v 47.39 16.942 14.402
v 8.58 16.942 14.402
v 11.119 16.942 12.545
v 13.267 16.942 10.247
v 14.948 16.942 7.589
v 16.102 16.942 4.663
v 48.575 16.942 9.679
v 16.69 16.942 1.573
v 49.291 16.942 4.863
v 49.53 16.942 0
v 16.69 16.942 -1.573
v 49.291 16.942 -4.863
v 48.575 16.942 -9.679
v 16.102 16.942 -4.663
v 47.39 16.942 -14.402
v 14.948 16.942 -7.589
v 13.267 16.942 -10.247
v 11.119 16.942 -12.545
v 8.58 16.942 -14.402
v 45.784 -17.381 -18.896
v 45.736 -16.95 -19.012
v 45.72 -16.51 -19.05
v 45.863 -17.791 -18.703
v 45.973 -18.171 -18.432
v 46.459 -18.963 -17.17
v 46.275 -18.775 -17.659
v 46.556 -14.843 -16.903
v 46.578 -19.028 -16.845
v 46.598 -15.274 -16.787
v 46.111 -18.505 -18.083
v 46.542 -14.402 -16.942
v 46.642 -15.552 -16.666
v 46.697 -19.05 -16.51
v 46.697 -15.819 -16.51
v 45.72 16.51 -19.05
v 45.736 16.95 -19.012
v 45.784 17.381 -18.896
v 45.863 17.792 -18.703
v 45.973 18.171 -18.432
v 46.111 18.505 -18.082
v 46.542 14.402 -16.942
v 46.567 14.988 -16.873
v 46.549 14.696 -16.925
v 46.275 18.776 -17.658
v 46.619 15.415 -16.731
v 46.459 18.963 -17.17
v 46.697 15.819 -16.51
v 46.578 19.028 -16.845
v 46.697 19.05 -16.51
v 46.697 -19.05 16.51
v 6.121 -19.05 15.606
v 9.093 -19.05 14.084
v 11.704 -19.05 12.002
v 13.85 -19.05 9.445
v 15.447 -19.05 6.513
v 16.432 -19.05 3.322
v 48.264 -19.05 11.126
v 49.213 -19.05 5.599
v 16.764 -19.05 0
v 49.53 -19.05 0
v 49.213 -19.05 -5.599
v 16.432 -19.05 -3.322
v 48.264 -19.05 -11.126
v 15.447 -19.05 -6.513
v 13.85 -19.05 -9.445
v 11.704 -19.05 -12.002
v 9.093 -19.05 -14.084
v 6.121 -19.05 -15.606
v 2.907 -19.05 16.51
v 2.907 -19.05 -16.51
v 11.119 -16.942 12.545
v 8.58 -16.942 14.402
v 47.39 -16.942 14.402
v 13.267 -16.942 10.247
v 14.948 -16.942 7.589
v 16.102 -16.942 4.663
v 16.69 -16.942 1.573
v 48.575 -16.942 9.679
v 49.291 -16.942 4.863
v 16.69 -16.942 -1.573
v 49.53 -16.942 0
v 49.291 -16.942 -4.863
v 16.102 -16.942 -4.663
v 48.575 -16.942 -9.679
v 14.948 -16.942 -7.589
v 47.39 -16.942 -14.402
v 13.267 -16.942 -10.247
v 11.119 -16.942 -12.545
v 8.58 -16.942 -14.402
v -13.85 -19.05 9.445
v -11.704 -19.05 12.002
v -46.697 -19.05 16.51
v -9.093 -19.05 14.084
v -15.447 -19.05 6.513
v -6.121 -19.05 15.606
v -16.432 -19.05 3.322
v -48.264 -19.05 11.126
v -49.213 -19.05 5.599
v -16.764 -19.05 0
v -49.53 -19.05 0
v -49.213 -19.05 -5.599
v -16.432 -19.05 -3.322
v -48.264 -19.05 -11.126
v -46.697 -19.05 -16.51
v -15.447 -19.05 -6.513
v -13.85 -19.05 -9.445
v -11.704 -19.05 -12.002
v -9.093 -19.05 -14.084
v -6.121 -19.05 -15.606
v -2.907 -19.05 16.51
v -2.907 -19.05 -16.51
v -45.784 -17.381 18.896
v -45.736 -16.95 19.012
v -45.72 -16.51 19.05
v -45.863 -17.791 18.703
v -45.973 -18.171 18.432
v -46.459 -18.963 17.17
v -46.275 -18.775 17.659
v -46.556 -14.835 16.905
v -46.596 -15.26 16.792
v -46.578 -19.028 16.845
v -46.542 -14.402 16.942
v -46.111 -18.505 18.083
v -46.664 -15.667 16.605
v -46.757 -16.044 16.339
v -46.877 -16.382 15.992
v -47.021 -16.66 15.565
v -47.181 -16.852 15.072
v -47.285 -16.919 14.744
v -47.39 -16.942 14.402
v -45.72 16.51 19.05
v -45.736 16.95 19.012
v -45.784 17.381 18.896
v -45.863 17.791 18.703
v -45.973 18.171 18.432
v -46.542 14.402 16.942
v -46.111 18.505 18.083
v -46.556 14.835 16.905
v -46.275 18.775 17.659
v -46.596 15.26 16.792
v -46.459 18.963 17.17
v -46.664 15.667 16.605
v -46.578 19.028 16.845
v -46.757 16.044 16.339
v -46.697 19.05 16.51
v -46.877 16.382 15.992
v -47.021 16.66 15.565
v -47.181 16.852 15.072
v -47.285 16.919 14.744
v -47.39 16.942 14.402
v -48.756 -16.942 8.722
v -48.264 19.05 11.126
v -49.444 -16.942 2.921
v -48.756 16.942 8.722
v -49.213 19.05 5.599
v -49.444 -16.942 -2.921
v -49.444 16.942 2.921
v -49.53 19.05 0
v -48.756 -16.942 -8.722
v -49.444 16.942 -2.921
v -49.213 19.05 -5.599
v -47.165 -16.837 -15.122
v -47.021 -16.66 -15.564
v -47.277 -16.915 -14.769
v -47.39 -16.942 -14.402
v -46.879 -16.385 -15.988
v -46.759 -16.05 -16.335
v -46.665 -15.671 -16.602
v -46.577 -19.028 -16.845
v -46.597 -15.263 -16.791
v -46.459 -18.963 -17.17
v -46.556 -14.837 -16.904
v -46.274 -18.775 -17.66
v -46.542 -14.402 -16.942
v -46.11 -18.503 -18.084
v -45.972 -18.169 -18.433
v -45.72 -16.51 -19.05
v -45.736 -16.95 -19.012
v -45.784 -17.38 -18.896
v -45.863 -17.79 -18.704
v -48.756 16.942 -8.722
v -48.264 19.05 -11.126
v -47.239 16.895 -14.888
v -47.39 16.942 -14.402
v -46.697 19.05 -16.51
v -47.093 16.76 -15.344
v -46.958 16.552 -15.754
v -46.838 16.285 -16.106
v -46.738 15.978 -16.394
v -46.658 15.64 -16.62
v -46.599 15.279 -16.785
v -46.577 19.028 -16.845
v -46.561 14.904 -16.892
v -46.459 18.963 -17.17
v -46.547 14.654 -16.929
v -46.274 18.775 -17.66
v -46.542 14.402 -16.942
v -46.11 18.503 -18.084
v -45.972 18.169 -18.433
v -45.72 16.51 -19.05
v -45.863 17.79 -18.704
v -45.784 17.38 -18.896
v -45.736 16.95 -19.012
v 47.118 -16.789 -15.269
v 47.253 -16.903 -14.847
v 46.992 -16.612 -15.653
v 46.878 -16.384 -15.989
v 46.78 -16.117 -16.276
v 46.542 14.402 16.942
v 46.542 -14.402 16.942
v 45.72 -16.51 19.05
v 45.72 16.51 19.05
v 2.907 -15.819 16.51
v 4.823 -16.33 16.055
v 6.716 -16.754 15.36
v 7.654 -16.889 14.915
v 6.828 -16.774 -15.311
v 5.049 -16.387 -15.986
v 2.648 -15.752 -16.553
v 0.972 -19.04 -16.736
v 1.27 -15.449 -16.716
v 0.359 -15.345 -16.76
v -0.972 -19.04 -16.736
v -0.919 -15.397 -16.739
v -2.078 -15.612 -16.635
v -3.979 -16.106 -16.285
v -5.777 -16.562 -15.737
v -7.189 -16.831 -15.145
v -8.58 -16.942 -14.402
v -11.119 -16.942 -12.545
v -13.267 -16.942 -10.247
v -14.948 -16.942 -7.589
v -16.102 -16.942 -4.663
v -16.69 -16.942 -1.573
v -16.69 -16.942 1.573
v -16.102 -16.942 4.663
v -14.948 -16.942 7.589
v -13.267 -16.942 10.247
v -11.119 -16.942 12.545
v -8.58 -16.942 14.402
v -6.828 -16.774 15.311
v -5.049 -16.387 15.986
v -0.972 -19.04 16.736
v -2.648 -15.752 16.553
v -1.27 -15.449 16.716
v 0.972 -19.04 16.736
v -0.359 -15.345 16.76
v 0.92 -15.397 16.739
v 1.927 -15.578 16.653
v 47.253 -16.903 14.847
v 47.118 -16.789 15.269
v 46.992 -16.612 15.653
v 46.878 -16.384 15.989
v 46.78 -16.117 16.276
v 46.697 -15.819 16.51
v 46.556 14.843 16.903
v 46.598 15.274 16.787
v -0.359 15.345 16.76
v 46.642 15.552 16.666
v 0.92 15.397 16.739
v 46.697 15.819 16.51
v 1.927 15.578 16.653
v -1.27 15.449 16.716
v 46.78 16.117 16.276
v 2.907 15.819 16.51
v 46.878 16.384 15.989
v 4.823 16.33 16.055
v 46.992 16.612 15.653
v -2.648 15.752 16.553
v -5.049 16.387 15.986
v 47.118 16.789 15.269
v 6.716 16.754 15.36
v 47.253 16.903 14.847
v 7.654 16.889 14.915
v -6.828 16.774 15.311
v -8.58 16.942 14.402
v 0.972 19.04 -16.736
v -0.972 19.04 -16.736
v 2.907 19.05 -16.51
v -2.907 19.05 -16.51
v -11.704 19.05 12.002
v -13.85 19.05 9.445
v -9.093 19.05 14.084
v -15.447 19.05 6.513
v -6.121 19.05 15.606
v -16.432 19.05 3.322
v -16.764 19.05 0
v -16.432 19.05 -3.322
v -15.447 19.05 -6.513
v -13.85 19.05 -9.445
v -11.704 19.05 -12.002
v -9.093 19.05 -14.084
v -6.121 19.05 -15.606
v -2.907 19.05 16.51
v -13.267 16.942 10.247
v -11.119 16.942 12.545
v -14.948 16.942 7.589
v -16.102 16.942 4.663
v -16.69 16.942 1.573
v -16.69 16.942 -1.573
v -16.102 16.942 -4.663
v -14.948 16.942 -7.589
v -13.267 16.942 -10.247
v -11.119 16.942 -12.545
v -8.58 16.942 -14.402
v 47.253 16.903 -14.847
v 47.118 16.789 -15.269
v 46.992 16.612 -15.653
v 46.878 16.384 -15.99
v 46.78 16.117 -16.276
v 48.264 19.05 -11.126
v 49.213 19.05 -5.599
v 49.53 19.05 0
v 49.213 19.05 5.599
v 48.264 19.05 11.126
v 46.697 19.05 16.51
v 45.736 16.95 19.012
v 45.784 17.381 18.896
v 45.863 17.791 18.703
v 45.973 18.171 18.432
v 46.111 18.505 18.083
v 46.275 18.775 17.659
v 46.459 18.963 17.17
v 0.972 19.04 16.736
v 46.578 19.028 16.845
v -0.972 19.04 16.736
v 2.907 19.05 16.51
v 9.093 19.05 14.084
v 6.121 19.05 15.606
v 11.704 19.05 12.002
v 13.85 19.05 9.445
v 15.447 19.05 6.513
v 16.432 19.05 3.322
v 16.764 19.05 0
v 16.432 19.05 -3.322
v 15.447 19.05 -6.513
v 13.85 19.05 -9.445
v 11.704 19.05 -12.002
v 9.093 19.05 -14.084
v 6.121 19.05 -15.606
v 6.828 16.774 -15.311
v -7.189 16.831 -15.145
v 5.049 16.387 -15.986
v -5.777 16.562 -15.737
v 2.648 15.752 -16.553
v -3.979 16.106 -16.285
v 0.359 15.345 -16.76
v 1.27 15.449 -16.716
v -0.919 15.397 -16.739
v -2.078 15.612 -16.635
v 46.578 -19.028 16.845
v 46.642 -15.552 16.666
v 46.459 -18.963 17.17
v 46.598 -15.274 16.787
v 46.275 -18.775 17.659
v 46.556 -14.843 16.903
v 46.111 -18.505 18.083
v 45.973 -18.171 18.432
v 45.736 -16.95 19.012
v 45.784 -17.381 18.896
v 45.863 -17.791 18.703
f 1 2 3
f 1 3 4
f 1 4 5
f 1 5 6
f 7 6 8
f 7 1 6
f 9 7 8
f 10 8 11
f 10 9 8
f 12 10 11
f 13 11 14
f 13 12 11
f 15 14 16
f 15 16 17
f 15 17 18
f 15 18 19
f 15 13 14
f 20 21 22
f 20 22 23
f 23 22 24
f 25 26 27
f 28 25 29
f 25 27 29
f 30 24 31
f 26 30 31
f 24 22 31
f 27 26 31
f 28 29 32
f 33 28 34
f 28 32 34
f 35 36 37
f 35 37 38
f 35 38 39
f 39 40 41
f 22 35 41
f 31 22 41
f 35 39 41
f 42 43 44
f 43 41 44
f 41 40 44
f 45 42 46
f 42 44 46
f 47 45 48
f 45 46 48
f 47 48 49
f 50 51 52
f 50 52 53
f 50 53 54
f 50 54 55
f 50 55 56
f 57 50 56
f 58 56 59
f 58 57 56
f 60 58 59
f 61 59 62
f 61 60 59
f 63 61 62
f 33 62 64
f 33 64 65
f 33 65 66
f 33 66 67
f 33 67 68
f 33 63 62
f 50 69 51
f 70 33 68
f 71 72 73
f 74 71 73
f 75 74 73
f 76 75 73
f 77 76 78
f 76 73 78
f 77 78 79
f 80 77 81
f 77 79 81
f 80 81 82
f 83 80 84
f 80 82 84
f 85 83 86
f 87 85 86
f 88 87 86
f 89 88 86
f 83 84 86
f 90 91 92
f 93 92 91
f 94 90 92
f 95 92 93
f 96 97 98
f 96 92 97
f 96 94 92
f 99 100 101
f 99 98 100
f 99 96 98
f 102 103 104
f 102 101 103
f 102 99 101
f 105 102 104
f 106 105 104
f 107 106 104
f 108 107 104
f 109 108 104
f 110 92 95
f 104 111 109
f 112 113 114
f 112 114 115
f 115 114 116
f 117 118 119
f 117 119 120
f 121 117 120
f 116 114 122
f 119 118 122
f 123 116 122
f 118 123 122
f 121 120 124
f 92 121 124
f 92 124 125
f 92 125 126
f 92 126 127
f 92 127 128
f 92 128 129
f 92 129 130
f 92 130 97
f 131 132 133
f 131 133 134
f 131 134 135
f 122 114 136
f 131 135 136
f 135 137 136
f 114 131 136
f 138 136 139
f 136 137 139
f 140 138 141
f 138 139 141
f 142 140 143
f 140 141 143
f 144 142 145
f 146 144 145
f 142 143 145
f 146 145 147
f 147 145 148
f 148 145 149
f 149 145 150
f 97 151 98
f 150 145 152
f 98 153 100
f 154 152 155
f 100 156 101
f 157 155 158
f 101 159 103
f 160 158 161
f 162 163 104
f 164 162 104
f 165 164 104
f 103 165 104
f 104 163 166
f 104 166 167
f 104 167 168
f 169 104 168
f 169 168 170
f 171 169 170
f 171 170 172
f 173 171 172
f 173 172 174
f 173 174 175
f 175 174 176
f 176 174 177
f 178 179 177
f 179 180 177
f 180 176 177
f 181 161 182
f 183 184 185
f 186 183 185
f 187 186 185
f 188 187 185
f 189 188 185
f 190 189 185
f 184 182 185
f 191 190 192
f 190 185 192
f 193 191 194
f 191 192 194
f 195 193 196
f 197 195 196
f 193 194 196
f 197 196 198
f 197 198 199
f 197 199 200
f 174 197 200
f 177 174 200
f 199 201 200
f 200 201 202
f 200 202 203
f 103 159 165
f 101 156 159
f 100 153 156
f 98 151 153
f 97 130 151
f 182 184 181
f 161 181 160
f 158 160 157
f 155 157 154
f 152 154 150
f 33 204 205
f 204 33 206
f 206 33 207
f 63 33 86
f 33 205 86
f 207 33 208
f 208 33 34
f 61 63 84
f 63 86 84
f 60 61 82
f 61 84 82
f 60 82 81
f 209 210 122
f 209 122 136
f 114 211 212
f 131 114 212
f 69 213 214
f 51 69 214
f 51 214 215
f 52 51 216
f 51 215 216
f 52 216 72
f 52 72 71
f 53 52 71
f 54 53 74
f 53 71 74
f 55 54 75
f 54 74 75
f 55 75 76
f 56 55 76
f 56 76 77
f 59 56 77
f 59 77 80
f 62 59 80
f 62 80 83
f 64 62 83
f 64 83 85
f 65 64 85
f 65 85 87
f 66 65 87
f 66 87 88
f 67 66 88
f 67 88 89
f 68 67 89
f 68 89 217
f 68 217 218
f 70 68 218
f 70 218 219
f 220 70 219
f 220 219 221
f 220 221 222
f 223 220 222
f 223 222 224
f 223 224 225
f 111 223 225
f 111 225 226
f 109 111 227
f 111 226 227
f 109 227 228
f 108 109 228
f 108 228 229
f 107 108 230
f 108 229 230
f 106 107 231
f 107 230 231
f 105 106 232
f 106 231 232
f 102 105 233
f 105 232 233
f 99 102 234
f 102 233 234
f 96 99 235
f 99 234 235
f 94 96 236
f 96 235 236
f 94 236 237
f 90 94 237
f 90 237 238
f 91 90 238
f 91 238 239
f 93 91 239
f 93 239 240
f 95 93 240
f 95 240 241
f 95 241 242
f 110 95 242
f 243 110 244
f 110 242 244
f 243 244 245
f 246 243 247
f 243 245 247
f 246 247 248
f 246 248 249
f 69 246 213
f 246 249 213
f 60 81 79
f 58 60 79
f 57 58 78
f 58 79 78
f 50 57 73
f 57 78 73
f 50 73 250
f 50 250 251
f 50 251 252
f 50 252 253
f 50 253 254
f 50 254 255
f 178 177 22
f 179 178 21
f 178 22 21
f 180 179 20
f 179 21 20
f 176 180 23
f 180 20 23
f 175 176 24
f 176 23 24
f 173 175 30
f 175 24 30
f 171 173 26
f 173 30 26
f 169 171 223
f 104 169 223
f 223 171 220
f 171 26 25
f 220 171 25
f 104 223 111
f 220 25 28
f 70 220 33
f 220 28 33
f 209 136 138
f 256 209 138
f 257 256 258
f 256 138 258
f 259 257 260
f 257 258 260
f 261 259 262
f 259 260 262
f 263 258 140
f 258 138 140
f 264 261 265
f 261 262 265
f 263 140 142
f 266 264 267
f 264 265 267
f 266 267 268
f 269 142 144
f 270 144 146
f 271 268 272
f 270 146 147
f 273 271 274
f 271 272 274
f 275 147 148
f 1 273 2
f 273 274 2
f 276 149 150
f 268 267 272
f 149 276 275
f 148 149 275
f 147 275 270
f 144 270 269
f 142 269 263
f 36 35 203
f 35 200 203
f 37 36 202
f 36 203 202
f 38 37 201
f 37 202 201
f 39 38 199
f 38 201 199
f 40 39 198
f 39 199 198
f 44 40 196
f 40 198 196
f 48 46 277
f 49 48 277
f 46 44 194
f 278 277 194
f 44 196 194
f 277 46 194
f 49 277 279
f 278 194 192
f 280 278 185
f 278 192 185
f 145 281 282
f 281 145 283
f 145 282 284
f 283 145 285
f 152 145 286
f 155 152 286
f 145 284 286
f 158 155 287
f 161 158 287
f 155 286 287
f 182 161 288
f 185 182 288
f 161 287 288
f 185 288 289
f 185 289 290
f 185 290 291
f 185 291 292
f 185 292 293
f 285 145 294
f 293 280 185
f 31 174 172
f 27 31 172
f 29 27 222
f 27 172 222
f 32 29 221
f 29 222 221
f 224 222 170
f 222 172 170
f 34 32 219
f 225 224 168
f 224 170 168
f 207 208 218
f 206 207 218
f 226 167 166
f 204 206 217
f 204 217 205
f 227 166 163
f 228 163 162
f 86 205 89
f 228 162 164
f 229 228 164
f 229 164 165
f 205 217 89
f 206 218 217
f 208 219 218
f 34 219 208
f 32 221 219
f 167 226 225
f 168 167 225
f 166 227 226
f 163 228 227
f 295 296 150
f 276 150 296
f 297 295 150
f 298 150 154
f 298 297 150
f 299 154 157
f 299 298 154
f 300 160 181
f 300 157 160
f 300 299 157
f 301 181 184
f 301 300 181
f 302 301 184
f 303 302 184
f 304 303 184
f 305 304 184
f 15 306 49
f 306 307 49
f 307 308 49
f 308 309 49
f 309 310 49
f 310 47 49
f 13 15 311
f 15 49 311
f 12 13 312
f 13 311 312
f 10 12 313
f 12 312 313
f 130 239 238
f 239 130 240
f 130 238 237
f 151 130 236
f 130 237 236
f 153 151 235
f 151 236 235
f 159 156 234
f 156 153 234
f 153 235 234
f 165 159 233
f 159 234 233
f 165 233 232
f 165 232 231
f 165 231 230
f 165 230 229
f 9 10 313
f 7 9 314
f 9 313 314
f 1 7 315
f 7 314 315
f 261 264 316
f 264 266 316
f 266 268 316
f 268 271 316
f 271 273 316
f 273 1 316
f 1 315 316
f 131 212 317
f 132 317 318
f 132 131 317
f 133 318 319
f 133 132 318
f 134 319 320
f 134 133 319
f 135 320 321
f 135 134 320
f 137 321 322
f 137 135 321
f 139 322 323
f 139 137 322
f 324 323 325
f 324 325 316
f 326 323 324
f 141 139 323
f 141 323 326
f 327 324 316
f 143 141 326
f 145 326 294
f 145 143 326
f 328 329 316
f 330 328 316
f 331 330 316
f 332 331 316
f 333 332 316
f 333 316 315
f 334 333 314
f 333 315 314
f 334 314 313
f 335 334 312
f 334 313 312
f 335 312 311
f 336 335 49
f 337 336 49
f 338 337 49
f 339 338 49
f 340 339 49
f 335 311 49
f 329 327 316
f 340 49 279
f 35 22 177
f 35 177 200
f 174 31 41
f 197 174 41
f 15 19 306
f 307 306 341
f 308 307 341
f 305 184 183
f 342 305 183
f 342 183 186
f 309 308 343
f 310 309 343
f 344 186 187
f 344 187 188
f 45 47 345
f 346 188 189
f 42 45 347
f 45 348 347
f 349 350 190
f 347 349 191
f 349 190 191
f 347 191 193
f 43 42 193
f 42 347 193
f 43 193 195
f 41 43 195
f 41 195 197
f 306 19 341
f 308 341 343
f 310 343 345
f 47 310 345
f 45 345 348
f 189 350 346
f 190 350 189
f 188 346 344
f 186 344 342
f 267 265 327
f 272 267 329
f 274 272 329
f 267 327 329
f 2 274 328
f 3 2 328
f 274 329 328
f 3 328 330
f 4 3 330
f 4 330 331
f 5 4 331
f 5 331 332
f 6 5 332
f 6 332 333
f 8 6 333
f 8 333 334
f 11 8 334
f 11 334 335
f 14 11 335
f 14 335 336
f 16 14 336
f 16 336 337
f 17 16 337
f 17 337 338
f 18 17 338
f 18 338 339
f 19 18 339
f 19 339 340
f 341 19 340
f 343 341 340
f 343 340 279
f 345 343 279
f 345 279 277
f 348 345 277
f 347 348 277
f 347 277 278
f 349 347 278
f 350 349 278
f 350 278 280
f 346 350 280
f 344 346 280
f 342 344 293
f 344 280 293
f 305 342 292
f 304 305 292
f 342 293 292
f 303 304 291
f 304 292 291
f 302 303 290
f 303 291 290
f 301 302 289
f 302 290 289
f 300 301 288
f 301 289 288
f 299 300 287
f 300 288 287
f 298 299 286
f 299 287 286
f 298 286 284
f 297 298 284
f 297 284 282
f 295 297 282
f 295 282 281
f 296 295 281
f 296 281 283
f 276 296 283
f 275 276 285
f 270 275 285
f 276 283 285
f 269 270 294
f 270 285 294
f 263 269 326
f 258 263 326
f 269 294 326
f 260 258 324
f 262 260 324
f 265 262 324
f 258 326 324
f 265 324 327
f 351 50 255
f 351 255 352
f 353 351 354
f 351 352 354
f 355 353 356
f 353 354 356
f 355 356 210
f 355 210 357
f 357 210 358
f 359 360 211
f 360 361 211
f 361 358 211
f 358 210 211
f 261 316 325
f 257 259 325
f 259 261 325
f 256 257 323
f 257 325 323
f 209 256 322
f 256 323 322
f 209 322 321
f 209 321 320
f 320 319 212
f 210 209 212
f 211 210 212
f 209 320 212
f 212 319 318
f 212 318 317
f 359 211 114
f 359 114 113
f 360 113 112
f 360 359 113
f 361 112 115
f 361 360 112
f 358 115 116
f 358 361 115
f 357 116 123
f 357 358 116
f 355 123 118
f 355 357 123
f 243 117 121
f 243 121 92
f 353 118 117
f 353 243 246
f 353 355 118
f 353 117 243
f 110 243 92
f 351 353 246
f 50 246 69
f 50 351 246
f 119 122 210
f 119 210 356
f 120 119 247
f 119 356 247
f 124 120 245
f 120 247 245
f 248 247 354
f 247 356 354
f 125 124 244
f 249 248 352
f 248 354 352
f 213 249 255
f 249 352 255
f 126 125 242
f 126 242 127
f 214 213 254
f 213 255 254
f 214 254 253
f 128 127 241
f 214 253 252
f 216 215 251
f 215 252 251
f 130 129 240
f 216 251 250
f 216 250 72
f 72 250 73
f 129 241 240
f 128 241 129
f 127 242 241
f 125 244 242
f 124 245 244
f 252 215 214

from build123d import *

# Parameters (mm, degrees)
SKETCH1_W           = 38.1
SKETCH1_H           = 38.1
SKETCH1_W_2         = 33.8836
SKETCH1_H_2         = 33.8836
BOSS_EXTRUDE1_DEPTH = 50.8
FILLET1_R           = 2.54
SKETCH3_R           = 16.764
CUT_EXTRUDE2_DEPTH  = 67.295946332
CUT_EXTRUDE3_DEPTH  = 67.295946494


with BuildPart() as part:
    # Sketch1 → Boss-Extrude1 (new, symmetric)
    with BuildSketch(Plane(origin=(0, 0, 0), x_dir=(0, 0, -1), z_dir=(1, 0, 0))):
        Rectangle(SKETCH1_W, SKETCH1_H)
        Rectangle(SKETCH1_W_2, SKETCH1_H_2, mode=Mode.SUBTRACT)
    extrude(amount=BOSS_EXTRUDE1_DEPTH, both=True)

    # Fillet1
    fillet1_edges = [part.edges().sort_by_distance(p)[0] for p in [
        (0, -16.9418, -16.9418),
        (0, 16.9418, -16.9418),
        (0, 16.9418, 16.9418),
        (0, -16.9418, 16.9418),
        (0, 19.05, 19.05),
        (0, 19.05, -19.05),
        (0, -19.05, -19.05),
        (0, -19.05, 19.05),
    ]]
    fillet(fillet1_edges, radius=FILLET1_R)

    # Sketch3 → Cut-Extrude2 (cut, through all)
    with BuildSketch(Plane(origin=(0, 19.05, 0), x_dir=(1, 0, 0), z_dir=(0, 1, 0))):
        with Locations(Location((0, 0, 0), (0, 0, 279.986551447))):
            Circle(SKETCH3_R)
    extrude(amount=-CUT_EXTRUDE2_DEPTH, mode=Mode.SUBTRACT)

    # Sketch4 → Cut-Extrude3 (cut, through all)
    with BuildSketch(Plane(origin=(0, 19.05, 0), x_dir=(1, 0, 0), z_dir=(0, 1, 0))):
        with BuildLine():
            Line((-45.72, 19.05), (-50.8, 19.05))
            Line((-50.8, 19.05), (-50.8, -19.05))
            Line((-50.8, -19.05), (-45.72, -19.05))
            ThreePointArc((-45.72, -19.05), (-49.53, 0), (-45.72, 19.05))
        make_face()
        with BuildLine():
            Line((50.8, 16.51), (46.69733183, 16.51))
            ThreePointArc((46.69733183, 16.51), (48.81669666, 8.375621006), (49.53, 0))
            ThreePointArc((49.53, 0), (48.81669666, -8.375621006), (46.69733183, -16.51))
            Line((46.69733183, -16.51), (50.8, -16.51))
            Line((50.8, -16.51), (50.8, 16.51))
        make_face()
        with BuildLine():
            Line((50.8, 19.05), (45.72, 19.05))
            ThreePointArc((45.72, 19.05), (46.226114974, 17.786713985), (46.69733183, 16.51))
            Line((46.69733183, 16.51), (50.8, 16.51))
            Line((50.8, 16.51), (50.8, 19.05))
        make_face()
        with BuildLine():
            ThreePointArc((46.69733183, -16.51), (46.226114974, -17.786713985), (45.72, -19.05))
            Line((45.72, -19.05), (50.8, -19.05))
            Line((50.8, -19.05), (50.8, -16.51))
            Line((50.8, -16.51), (46.69733183, -16.51))
        make_face()
    extrude(amount=-CUT_EXTRUDE3_DEPTH, mode=Mode.SUBTRACT)


solid = part.part
